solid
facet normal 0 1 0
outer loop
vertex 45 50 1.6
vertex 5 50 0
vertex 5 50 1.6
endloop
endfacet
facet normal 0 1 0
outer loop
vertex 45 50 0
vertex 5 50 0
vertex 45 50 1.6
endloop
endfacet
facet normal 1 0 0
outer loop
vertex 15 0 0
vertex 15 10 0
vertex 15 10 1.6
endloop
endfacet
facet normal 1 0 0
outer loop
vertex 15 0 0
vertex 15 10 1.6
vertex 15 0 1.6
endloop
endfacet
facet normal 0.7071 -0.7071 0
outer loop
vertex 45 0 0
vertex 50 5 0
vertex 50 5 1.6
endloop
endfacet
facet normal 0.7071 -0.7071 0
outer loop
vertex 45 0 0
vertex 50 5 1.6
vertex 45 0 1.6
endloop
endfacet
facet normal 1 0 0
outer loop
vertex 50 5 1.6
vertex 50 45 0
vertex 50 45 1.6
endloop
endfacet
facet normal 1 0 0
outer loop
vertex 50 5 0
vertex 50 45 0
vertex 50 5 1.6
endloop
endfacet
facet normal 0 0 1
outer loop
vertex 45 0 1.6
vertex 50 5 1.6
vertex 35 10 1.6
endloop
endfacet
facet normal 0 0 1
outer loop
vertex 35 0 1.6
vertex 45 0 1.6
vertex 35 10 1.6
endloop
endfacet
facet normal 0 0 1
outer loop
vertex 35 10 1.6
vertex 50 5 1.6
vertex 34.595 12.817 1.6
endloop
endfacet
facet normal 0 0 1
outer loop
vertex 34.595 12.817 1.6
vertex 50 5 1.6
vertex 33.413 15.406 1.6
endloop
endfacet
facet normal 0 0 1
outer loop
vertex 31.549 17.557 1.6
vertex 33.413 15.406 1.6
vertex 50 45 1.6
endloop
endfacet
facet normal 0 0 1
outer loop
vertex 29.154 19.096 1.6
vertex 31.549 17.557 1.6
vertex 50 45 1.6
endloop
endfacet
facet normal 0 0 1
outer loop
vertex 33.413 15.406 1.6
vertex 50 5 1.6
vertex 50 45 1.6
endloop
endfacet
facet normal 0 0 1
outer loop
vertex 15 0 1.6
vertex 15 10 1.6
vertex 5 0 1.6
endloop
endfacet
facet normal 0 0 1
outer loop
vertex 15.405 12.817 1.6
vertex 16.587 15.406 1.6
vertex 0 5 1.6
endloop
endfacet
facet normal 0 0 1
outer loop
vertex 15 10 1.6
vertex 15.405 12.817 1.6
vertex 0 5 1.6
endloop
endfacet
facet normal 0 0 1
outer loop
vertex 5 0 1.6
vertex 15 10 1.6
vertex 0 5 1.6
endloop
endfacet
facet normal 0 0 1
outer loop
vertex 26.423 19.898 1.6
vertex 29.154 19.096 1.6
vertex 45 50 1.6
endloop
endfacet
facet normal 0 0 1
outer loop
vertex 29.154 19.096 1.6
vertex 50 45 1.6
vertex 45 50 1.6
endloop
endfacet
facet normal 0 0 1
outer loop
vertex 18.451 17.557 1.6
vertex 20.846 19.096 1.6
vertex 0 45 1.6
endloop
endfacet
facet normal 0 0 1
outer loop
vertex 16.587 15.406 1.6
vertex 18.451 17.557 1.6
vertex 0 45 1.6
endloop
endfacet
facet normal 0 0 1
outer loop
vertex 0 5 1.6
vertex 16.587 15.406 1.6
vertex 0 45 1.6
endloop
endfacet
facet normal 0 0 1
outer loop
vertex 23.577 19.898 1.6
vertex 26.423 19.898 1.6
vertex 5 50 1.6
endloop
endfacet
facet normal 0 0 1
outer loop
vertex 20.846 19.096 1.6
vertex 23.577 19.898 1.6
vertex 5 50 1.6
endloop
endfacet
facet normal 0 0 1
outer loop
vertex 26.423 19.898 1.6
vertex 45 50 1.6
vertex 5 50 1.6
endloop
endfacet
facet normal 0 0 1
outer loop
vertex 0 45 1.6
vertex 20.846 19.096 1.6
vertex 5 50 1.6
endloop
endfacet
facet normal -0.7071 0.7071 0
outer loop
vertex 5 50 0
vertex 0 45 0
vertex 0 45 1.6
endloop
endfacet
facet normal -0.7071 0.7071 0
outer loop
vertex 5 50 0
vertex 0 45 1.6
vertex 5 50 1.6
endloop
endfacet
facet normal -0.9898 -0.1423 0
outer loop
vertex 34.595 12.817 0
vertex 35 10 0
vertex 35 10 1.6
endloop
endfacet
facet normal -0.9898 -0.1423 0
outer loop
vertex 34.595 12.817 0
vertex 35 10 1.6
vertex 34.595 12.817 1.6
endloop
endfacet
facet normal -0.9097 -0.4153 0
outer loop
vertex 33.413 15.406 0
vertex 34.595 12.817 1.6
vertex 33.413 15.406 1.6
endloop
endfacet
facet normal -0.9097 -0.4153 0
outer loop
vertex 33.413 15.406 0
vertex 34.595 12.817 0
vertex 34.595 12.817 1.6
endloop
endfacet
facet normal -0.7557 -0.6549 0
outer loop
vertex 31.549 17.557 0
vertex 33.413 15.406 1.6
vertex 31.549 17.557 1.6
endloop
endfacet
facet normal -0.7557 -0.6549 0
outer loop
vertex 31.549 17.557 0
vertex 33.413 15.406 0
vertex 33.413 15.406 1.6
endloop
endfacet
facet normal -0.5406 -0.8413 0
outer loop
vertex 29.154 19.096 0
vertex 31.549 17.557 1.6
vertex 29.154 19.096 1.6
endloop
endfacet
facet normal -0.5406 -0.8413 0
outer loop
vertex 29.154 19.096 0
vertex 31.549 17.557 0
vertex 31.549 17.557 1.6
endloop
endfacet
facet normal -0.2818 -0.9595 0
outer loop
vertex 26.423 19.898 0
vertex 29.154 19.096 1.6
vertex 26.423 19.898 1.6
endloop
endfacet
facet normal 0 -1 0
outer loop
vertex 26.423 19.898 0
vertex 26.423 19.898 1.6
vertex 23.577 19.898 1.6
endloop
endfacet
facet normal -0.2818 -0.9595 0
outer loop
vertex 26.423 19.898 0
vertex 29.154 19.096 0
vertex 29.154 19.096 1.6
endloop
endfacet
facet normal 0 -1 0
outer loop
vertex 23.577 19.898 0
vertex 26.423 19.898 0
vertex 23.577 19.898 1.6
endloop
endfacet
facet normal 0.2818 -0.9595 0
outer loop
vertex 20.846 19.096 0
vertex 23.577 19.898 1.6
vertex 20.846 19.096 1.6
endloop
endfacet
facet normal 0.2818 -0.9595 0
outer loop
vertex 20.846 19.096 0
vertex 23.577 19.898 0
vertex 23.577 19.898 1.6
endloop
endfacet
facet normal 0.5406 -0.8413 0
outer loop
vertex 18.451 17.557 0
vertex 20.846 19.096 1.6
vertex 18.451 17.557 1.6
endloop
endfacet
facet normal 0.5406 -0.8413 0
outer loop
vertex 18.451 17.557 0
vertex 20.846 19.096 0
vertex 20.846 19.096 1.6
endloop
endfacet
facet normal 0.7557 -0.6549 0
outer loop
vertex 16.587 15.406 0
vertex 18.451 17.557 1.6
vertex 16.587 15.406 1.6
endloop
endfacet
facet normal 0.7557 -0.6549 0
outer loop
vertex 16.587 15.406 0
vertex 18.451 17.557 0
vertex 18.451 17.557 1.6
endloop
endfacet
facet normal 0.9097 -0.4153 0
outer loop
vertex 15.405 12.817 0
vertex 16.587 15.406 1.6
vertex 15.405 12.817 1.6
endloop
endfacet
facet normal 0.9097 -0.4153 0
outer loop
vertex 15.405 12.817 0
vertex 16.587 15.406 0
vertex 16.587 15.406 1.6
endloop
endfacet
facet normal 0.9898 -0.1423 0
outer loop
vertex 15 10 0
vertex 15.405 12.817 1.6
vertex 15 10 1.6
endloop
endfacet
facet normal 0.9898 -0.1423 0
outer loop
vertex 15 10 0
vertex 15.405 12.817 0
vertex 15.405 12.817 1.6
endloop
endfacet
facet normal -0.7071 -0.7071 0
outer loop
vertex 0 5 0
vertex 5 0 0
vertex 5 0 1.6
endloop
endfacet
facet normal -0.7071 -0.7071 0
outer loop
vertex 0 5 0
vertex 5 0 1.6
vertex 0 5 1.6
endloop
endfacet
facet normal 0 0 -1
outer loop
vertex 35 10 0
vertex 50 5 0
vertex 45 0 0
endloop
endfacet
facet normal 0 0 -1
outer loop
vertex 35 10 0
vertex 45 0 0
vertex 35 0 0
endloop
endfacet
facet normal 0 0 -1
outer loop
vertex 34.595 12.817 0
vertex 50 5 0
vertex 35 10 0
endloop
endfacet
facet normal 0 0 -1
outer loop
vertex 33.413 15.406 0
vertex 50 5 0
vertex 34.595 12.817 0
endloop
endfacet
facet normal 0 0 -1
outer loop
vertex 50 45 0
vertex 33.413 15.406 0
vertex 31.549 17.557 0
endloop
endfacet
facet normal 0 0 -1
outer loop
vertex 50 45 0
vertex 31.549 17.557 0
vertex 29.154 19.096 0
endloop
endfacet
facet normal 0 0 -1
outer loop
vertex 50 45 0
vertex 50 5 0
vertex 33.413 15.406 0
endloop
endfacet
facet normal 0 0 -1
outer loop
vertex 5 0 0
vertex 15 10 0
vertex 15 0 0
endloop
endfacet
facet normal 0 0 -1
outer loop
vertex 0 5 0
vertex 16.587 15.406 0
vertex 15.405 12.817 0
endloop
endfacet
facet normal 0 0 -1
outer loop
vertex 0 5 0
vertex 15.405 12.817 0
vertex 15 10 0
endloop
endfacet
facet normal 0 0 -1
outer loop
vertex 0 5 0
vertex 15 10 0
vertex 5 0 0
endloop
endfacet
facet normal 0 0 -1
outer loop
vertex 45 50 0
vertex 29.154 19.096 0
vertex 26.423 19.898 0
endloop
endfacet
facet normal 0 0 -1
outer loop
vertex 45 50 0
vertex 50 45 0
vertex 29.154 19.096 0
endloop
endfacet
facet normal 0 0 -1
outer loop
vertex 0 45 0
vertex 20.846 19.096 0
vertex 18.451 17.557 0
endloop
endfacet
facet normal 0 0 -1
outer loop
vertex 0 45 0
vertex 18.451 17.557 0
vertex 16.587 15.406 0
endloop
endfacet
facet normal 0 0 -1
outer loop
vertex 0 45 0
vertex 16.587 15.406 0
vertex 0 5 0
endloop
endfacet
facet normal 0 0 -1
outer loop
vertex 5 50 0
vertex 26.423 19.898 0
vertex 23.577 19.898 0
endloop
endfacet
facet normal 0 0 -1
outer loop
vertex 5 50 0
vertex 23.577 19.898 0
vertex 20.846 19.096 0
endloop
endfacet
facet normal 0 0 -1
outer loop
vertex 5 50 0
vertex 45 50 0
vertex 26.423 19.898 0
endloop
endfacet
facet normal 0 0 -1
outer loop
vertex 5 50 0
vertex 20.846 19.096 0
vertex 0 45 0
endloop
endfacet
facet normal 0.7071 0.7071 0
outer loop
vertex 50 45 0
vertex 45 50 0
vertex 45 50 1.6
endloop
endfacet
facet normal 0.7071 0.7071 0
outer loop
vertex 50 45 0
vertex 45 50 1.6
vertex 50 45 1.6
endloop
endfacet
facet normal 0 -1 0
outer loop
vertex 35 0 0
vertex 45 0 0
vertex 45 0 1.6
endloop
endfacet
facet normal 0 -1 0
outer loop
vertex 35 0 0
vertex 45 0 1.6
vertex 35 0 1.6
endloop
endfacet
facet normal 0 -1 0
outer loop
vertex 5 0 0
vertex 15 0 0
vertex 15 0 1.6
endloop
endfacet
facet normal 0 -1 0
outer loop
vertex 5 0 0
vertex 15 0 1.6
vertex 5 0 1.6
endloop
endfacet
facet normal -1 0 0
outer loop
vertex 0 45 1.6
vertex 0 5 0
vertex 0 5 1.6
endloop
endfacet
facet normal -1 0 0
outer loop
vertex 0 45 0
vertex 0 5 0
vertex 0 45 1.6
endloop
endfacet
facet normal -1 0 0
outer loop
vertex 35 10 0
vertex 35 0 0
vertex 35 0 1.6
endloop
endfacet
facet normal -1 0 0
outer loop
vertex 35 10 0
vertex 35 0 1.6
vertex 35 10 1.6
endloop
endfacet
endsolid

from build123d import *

# Parameters (mm, degrees)
BOARD_DEPTH = 1.599999


with BuildPart() as part:
    # 草圖1 → Board (new body)
    with BuildSketch(Plane.XY):
        with BuildLine():
            Line((14.99999794, 9.99999778), (14.99999794, 0))
            Line((14.99999794, 0), (4.99999762, 0))
            Line((4.99999762, 0), (0, 4.99999762))
            Line((0, 4.99999762), (0, 44.9999989))
            Line((0, 44.9999989), (4.99999762, 49.99999906))
            Line((4.99999762, 49.99999906), (44.9999989, 49.99999906))
            Line((44.9999989, 49.99999906), (49.99999906, 44.9999989))
            Line((49.99999906, 44.9999989), (49.99999906, 4.99999762))
            Line((49.99999906, 4.99999762), (44.9999989, 0))
            Line((44.9999989, 0), (34.99999858, 0))
            Line((34.99999858, 0), (34.99999604, 9.99999778))
            ThreePointArc((34.99999604, 9.99999778), (24.99999699, 19.99999683), (14.99999794, 9.99999778))
        make_face()
    extrude(amount=BOARD_DEPTH)


solid = part.part
